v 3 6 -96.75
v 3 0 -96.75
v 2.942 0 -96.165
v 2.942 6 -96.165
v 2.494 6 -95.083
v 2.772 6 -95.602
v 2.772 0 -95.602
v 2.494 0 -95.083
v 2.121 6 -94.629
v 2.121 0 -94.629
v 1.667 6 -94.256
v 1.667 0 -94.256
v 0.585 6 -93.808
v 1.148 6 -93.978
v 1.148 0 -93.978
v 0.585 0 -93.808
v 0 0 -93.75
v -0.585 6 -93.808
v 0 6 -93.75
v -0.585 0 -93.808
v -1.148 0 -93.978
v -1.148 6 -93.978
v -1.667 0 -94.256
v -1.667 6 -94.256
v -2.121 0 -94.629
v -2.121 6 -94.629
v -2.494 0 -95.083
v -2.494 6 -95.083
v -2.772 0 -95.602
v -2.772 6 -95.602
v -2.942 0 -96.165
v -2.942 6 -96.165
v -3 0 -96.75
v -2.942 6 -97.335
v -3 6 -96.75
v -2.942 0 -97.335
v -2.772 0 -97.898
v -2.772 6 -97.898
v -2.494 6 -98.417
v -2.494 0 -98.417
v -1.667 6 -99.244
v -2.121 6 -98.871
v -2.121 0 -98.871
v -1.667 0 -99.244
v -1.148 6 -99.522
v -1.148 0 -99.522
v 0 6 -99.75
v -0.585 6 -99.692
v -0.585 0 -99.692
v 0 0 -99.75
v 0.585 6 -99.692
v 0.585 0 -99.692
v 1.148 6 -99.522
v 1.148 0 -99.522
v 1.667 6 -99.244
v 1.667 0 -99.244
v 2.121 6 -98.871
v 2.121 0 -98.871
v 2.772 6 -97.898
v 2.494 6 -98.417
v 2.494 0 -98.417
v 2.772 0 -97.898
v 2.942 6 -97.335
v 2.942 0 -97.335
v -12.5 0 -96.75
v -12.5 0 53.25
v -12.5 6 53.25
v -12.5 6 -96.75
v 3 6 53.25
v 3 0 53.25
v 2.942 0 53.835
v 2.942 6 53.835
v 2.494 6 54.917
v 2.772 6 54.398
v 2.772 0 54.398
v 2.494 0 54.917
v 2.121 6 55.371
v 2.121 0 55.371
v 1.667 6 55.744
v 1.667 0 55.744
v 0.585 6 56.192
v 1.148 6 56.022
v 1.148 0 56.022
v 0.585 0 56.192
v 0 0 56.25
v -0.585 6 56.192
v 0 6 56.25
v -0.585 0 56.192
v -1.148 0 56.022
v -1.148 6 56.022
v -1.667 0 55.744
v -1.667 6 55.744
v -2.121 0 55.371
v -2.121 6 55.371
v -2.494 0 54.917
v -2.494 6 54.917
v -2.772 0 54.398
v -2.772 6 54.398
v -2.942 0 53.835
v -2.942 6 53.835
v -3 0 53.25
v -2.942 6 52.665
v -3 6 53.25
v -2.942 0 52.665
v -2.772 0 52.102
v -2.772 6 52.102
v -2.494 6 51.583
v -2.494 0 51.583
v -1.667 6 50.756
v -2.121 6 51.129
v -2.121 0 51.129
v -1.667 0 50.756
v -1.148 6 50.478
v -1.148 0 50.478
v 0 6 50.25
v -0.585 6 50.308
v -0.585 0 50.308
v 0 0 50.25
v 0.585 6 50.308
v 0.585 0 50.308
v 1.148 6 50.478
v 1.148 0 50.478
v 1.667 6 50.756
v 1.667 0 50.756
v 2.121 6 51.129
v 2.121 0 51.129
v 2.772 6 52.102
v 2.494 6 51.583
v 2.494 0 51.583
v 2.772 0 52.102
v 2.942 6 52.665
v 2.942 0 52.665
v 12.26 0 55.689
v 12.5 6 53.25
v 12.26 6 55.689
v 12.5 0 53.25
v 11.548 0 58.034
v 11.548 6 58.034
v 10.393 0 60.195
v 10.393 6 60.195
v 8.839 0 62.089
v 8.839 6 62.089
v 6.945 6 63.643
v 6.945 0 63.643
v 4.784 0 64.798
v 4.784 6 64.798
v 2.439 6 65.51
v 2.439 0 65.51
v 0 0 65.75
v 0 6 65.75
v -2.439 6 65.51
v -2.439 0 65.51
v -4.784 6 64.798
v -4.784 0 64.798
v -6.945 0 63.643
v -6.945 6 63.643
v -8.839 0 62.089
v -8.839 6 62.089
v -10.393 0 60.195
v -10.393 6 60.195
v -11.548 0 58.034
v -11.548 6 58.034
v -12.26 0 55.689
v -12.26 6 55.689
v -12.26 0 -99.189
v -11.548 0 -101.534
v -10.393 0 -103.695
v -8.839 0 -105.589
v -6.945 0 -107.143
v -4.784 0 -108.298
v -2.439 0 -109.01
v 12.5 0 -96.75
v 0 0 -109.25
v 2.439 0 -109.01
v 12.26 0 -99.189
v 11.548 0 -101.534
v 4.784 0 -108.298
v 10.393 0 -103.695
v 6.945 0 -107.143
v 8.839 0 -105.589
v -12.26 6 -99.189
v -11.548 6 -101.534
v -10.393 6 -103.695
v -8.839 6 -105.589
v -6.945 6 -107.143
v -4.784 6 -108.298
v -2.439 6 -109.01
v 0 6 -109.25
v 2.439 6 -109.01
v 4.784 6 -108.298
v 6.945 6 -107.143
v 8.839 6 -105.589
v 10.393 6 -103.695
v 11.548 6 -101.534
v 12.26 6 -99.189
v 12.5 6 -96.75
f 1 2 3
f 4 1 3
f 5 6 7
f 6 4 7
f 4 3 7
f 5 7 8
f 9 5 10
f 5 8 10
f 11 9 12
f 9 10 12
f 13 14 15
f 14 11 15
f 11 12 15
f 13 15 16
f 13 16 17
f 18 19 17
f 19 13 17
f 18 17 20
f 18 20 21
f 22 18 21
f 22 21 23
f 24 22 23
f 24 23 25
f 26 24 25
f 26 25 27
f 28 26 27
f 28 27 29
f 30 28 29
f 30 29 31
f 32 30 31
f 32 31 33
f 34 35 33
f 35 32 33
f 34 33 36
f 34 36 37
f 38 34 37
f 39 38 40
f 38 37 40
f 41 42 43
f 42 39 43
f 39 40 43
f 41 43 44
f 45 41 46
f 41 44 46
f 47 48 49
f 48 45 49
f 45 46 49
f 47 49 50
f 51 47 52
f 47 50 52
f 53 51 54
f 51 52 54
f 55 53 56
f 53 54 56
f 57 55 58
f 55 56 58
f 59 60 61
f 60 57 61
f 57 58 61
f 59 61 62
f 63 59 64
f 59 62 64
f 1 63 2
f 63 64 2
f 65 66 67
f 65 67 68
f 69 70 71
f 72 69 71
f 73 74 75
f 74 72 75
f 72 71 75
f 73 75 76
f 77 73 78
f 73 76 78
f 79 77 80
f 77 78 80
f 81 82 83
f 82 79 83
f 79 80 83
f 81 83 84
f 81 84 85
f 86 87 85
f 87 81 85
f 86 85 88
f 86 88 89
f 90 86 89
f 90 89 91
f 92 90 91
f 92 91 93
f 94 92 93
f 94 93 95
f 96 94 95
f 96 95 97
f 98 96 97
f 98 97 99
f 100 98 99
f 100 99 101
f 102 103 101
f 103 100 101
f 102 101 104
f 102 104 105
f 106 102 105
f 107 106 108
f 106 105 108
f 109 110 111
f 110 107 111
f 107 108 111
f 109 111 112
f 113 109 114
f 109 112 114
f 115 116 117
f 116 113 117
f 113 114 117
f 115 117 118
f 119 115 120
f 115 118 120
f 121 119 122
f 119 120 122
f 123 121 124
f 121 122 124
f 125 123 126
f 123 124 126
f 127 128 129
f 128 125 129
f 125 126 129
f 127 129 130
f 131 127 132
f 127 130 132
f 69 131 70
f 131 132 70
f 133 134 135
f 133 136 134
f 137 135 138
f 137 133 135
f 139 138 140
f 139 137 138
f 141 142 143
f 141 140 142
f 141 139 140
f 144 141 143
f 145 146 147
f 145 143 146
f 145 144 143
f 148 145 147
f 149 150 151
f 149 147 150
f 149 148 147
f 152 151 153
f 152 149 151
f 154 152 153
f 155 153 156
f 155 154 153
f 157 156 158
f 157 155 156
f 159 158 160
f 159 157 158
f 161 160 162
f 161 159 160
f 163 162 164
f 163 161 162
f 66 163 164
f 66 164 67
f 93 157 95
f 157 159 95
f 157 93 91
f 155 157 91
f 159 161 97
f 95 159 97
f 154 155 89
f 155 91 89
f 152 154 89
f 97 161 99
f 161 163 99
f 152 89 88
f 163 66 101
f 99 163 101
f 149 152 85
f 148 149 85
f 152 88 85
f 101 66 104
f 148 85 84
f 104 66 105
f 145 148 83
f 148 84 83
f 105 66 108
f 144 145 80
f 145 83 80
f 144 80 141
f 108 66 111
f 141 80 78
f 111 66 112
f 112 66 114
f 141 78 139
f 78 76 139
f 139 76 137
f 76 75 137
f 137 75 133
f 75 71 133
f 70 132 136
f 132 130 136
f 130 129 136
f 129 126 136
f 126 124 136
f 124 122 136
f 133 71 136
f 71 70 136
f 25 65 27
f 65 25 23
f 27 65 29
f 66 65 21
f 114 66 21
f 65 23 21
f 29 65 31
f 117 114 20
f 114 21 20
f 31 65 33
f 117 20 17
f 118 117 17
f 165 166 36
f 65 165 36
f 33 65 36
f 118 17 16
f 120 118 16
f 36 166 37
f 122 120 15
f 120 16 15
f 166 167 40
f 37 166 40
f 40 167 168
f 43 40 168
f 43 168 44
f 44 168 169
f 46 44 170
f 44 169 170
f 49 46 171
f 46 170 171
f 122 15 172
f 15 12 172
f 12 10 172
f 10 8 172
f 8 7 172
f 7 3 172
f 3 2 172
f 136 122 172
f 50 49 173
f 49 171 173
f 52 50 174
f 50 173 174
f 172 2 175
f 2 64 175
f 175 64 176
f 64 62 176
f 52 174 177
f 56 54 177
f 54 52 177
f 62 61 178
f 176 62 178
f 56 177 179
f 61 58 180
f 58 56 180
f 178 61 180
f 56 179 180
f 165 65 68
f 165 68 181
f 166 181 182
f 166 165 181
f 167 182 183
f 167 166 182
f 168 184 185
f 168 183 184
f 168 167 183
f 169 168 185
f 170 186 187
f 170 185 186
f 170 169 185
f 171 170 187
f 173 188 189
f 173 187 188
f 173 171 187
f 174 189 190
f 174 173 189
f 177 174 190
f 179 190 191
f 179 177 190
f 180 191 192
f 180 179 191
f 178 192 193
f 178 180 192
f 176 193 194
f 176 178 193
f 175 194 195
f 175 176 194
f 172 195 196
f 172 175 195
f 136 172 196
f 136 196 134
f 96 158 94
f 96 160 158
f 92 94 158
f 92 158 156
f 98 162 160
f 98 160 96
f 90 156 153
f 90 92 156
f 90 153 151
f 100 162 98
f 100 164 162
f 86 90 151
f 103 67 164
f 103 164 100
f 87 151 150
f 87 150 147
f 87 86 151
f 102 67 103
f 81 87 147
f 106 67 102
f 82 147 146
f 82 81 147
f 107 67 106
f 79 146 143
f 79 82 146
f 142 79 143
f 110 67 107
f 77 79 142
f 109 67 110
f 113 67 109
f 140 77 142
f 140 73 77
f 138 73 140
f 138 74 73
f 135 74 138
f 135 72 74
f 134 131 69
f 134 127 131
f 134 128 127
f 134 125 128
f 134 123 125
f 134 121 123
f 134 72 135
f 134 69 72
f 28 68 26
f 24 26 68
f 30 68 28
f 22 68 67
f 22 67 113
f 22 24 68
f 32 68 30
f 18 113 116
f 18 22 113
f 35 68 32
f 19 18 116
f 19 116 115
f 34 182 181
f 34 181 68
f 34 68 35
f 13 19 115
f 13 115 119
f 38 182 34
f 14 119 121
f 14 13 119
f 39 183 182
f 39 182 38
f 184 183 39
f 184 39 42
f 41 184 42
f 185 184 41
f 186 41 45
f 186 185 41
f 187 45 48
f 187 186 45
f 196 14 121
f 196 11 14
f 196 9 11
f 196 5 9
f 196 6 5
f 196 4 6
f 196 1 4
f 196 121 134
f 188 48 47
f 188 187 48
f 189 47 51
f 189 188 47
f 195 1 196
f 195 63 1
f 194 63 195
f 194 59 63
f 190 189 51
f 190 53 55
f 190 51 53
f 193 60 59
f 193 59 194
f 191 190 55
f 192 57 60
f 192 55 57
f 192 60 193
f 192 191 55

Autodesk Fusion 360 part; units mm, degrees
sketch "Sketch1" plane through (0, 0, 0) normal (0, 1, 0) x (1, 0, 0)
  circle A0 centre (0, 96.75) radius 3
  arc A1 (12.5, 96.75) -> (-12.5, 96.75) centre (0, 96.75) ccw
  line L0 (12.5, 96.75) -> (12.5, -53.25)
  arc A2 (-12.5, -53.25) -> (12.5, -53.25) centre (0, -53.25) ccw
  line L1 (-12.5, -53.25) -> (-12.5, 96.75)
  circle A3 centre (0, -53.25) radius 3
  point P0 (-35.6168, 0)
extrude "Extrude1" add sketch "Sketch1" along normal blind 6
